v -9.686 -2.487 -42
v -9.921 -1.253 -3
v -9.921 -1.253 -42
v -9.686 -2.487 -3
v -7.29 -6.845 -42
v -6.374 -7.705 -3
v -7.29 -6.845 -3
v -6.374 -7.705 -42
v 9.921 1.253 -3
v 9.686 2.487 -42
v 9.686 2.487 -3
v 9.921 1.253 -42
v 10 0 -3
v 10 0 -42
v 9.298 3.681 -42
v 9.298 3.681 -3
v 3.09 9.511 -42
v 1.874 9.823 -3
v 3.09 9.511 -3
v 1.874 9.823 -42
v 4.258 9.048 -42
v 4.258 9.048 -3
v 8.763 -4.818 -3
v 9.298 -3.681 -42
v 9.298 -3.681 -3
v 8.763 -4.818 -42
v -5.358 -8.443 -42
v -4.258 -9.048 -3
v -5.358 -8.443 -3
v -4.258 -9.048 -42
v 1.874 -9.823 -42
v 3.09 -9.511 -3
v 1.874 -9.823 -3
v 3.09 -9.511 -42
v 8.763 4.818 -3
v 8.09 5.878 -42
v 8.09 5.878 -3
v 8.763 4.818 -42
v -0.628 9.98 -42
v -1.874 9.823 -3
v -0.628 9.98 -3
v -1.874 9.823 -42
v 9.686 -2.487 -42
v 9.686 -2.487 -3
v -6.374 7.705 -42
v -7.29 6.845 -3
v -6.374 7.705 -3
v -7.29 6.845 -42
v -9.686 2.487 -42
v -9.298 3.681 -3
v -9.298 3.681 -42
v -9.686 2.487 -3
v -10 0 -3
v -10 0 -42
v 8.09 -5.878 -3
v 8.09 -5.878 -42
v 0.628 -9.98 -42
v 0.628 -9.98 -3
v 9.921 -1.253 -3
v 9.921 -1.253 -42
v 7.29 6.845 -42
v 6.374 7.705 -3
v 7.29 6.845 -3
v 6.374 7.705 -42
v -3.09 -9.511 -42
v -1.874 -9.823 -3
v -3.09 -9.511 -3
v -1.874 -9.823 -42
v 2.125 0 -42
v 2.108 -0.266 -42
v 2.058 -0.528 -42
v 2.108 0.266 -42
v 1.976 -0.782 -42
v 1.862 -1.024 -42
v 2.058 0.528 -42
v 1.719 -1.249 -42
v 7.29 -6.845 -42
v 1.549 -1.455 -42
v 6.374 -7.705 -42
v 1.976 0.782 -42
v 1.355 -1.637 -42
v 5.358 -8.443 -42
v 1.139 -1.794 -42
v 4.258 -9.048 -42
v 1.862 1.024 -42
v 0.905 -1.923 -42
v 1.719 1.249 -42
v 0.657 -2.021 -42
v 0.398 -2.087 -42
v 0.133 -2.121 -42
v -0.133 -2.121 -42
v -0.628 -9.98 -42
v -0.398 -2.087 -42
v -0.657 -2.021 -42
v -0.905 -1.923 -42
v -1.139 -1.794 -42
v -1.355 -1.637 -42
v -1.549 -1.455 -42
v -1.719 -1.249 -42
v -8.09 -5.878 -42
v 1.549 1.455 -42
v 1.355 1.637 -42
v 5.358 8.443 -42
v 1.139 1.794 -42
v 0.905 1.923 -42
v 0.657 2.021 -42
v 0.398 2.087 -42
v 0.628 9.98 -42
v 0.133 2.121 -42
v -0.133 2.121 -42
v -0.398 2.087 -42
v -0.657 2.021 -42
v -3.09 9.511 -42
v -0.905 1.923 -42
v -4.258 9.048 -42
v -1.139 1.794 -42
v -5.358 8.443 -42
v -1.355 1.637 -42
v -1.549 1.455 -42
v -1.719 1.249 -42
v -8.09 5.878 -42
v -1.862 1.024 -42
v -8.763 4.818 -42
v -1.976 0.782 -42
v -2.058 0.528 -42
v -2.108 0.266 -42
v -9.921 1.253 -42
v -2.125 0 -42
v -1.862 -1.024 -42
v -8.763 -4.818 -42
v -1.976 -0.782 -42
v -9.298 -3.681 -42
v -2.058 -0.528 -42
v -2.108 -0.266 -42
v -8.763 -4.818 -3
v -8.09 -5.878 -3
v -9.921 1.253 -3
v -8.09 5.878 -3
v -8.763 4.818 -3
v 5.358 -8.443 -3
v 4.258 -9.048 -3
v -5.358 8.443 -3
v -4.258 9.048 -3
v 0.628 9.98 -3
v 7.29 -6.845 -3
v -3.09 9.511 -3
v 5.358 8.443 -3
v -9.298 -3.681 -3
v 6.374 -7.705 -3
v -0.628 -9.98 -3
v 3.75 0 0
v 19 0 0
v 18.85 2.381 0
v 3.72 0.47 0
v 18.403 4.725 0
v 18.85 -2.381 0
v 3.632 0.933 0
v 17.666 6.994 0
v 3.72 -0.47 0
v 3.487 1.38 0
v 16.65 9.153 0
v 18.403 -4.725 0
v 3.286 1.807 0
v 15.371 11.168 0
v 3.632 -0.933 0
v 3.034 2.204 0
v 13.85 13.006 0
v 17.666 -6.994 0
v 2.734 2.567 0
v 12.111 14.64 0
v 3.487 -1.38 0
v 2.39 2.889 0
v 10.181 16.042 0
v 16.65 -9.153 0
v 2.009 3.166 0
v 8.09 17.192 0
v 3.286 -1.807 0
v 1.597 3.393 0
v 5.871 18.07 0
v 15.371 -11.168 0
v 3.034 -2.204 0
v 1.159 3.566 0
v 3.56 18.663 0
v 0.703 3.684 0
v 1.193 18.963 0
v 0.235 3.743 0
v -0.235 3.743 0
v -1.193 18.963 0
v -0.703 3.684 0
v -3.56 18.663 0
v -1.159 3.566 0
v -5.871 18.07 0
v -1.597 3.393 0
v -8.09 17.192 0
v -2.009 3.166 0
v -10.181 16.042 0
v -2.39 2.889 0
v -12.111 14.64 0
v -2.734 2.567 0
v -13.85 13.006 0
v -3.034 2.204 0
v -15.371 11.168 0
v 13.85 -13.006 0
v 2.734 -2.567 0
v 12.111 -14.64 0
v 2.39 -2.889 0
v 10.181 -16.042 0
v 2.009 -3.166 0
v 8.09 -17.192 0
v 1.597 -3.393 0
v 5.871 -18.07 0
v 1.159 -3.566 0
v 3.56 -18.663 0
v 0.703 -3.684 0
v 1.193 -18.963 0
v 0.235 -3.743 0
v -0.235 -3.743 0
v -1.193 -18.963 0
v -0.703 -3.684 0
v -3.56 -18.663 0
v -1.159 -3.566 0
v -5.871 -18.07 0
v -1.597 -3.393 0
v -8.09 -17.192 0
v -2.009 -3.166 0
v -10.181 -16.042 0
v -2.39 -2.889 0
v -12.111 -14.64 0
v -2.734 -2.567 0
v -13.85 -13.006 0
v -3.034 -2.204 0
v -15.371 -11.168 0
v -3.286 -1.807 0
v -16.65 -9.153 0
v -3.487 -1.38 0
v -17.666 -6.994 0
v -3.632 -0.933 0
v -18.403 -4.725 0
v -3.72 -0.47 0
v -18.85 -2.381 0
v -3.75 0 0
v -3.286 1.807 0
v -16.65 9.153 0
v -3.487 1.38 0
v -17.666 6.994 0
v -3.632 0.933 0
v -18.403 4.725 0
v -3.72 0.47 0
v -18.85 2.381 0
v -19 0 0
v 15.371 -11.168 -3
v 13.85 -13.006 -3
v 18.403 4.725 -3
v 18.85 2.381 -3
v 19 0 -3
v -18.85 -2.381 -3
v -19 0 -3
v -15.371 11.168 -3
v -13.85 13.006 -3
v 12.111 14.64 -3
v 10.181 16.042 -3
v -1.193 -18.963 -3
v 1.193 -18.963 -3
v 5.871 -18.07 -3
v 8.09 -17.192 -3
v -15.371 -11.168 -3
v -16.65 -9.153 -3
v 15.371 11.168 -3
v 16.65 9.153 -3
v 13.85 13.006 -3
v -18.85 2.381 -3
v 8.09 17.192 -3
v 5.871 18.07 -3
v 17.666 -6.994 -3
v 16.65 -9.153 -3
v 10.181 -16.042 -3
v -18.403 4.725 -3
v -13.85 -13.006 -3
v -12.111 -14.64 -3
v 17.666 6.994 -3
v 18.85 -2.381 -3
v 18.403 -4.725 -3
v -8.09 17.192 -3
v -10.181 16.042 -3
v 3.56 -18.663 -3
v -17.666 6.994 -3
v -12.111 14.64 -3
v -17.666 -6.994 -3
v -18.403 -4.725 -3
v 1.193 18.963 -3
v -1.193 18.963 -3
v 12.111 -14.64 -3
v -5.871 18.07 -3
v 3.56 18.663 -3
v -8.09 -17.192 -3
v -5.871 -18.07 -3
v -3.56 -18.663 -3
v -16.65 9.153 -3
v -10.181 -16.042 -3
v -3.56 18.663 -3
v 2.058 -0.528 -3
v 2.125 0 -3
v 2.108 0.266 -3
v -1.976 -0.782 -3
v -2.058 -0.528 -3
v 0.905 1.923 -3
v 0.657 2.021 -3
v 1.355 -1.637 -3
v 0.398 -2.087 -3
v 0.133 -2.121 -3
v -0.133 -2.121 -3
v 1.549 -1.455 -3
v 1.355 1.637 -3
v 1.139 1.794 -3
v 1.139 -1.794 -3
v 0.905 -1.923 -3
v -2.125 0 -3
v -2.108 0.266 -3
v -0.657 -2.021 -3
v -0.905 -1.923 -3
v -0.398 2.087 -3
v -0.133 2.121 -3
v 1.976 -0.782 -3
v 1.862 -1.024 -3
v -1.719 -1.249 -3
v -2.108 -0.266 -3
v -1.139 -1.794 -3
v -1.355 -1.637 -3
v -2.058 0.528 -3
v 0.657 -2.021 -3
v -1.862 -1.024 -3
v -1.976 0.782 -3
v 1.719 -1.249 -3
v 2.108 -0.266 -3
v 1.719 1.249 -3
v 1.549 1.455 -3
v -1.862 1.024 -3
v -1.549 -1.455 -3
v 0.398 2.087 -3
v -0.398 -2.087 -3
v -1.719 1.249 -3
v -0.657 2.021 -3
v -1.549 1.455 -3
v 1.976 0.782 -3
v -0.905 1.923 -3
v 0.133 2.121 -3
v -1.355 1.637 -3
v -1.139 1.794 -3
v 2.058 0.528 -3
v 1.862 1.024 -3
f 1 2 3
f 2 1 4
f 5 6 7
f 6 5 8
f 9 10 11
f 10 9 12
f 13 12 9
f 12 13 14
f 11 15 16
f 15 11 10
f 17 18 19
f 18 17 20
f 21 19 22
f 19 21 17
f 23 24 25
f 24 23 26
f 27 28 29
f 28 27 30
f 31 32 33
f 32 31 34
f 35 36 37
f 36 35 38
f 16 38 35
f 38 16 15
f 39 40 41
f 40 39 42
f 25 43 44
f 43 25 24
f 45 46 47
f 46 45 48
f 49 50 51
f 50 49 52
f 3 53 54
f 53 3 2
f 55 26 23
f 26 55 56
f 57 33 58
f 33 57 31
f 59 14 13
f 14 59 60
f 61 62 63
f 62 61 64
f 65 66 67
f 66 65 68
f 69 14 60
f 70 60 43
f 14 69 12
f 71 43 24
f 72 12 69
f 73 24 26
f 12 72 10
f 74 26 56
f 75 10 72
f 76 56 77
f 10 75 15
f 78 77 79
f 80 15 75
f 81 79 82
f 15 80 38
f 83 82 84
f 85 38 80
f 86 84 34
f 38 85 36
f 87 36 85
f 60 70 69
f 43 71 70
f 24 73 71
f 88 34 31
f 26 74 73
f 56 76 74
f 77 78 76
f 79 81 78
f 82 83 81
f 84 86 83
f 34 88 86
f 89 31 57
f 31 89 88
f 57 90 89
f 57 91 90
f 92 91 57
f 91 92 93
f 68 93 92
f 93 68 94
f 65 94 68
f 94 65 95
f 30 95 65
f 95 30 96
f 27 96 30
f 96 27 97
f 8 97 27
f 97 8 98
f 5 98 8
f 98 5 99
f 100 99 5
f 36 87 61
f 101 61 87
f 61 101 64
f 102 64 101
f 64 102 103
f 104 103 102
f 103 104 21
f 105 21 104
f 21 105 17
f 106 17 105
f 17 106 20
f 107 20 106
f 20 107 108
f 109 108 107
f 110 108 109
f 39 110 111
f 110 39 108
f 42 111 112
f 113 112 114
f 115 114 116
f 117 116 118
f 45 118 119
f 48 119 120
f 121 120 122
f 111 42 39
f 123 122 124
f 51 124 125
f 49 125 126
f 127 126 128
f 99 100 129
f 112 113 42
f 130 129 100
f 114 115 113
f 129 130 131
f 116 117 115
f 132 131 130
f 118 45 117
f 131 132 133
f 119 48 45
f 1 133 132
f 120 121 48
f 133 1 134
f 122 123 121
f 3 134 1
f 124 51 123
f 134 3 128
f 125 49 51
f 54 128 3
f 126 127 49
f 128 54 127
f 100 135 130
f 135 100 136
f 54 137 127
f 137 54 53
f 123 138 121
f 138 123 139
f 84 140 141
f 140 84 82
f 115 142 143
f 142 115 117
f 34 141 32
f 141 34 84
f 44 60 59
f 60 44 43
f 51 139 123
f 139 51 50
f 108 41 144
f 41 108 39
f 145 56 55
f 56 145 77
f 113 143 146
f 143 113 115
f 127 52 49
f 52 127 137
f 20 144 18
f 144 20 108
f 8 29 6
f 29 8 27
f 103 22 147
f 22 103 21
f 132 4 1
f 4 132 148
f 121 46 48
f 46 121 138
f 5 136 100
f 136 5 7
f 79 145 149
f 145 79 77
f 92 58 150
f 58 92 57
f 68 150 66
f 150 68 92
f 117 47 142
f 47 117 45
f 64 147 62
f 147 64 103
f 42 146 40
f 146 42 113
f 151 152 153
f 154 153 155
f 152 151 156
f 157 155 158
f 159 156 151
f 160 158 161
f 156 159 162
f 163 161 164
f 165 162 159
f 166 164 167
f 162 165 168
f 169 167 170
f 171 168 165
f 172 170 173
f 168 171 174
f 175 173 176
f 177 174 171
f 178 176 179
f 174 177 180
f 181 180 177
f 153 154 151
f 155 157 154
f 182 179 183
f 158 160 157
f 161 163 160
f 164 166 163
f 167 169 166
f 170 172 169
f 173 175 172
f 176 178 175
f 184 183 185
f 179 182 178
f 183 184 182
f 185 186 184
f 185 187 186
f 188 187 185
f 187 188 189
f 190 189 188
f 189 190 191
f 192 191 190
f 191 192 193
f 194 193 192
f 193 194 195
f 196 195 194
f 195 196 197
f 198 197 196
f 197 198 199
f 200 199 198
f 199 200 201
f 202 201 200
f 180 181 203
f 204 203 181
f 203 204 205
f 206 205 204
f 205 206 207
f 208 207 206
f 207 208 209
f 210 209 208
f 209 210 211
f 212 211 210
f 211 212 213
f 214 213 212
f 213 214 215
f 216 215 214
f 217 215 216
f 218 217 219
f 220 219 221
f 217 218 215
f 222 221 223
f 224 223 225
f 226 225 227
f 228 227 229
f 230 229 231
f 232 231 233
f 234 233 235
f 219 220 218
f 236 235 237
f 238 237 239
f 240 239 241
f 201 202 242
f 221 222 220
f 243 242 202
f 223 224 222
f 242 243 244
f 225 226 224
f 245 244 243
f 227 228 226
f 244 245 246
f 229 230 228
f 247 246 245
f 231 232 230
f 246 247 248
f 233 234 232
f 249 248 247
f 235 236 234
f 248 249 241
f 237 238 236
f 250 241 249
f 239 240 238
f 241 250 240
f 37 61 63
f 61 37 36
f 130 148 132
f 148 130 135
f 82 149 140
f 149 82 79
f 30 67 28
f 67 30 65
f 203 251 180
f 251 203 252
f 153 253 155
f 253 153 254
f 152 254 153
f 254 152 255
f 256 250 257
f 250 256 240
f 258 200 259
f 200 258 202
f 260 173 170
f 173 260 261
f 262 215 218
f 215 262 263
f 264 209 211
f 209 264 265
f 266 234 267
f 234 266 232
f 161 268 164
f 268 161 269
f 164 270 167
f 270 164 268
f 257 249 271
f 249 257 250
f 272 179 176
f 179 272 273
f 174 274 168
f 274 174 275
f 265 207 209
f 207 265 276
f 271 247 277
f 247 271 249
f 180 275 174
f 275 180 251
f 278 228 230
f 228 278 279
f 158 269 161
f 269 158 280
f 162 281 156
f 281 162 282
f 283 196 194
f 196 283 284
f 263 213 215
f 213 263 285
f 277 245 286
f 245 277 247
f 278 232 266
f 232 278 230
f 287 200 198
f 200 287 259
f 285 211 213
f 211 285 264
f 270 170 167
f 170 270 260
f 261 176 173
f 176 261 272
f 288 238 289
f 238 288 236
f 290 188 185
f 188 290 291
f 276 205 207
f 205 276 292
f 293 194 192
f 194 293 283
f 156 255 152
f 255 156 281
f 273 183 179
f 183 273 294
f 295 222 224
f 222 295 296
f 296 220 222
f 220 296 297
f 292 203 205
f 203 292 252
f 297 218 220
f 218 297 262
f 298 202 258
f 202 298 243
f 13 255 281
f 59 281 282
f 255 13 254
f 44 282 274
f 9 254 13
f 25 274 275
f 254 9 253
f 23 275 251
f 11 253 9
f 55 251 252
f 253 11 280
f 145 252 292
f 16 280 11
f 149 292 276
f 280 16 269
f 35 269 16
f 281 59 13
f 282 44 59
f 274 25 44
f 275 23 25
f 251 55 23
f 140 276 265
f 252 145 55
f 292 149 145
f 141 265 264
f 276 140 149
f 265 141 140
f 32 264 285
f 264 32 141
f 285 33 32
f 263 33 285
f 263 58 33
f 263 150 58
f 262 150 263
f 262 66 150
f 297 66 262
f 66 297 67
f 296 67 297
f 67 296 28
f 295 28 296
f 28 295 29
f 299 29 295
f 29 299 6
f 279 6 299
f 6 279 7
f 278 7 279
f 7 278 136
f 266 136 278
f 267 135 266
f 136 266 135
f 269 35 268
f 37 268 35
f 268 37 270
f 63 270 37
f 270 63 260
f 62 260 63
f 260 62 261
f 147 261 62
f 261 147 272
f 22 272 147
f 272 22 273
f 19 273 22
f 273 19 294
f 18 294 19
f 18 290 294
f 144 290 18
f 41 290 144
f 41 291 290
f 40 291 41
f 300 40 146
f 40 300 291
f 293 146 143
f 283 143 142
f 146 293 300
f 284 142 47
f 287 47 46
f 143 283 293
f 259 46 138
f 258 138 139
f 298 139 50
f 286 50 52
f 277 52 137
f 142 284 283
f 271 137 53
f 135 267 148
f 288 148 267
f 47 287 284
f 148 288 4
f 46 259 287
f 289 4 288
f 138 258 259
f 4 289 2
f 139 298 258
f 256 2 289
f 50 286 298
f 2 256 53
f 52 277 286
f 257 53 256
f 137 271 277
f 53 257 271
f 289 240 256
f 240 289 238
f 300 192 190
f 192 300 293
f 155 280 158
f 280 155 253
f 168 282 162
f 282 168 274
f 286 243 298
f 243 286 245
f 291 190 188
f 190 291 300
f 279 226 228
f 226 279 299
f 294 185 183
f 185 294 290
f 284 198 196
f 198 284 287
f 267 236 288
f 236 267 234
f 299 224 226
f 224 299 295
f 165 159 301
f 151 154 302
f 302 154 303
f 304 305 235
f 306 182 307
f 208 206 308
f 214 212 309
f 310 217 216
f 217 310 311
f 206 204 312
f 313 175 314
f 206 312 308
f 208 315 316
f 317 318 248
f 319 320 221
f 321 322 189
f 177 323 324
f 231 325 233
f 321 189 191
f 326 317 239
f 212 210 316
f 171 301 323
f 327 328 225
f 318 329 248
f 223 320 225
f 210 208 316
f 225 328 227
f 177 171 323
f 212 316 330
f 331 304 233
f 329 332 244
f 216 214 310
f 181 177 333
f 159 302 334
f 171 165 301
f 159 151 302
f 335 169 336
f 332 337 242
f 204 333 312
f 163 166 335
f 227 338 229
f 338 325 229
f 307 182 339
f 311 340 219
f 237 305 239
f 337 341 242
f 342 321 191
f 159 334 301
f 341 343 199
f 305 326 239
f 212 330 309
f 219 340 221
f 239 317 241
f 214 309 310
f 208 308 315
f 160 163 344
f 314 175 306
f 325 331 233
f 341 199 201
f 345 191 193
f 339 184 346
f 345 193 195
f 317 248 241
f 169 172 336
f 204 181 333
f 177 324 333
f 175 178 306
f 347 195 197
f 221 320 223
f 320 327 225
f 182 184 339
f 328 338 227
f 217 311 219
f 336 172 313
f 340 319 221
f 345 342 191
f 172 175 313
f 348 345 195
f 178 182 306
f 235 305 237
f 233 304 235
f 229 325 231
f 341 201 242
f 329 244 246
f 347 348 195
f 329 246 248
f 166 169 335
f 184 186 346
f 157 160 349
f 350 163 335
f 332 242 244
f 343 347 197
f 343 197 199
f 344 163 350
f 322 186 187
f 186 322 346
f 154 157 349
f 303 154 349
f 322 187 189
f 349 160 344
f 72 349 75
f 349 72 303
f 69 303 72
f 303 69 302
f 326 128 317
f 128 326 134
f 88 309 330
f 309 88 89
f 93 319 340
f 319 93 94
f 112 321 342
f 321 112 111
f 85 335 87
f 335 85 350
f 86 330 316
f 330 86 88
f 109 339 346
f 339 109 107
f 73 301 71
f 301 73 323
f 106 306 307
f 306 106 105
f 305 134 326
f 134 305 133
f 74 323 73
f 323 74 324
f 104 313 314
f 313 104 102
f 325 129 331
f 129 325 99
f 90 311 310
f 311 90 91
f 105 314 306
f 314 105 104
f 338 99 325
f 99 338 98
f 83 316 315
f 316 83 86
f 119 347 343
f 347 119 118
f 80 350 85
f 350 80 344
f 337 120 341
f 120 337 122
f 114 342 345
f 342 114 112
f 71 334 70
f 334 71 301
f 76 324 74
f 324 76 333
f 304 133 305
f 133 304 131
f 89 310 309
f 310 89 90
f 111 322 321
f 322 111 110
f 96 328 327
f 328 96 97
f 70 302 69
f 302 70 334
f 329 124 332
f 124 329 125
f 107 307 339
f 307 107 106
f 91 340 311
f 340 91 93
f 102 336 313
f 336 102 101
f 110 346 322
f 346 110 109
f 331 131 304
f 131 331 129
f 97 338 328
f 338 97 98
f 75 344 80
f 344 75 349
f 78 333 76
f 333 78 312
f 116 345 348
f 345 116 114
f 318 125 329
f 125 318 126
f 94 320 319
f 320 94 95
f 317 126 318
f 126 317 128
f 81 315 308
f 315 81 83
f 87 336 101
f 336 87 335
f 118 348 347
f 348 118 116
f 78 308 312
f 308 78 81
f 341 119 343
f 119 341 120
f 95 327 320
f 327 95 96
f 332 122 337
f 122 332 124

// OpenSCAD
$fn = 50;


difference() {
	union() {
		translate(v = [0, 0, -42.0000000000]) {
			cylinder(h = 42, r = 10.0000000000);
		}
		translate(v = [0, 0, -3.0000000000]) {
			cylinder(h = 3, r = 19.0000000000);
		}
	}
	union() {
		translate(v = [0, 0, 0]) {
			rotate(a = [0, 0, 0]) {
				difference() {
					union() {
						#translate(v = [0, 0, -42.0000000000]) {
							cylinder(h = 42, r = 2.0000000000);
						}
						#translate(v = [0, 0, -3]) {
							cylinder(h = 3, r1 = 2.1250000000, r2 = 3.7500000000);
						}
						#translate(v = [0, 0, -42.0000000000]) {
							cylinder(h = 42, r = 2.1250000000);
						}
						#translate(v = [0, 0, -42.0000000000]) {
							cylinder(h = 42, r = 2.0000000000);
						}
					}
					union();
				}
			}
		}
	}
}
